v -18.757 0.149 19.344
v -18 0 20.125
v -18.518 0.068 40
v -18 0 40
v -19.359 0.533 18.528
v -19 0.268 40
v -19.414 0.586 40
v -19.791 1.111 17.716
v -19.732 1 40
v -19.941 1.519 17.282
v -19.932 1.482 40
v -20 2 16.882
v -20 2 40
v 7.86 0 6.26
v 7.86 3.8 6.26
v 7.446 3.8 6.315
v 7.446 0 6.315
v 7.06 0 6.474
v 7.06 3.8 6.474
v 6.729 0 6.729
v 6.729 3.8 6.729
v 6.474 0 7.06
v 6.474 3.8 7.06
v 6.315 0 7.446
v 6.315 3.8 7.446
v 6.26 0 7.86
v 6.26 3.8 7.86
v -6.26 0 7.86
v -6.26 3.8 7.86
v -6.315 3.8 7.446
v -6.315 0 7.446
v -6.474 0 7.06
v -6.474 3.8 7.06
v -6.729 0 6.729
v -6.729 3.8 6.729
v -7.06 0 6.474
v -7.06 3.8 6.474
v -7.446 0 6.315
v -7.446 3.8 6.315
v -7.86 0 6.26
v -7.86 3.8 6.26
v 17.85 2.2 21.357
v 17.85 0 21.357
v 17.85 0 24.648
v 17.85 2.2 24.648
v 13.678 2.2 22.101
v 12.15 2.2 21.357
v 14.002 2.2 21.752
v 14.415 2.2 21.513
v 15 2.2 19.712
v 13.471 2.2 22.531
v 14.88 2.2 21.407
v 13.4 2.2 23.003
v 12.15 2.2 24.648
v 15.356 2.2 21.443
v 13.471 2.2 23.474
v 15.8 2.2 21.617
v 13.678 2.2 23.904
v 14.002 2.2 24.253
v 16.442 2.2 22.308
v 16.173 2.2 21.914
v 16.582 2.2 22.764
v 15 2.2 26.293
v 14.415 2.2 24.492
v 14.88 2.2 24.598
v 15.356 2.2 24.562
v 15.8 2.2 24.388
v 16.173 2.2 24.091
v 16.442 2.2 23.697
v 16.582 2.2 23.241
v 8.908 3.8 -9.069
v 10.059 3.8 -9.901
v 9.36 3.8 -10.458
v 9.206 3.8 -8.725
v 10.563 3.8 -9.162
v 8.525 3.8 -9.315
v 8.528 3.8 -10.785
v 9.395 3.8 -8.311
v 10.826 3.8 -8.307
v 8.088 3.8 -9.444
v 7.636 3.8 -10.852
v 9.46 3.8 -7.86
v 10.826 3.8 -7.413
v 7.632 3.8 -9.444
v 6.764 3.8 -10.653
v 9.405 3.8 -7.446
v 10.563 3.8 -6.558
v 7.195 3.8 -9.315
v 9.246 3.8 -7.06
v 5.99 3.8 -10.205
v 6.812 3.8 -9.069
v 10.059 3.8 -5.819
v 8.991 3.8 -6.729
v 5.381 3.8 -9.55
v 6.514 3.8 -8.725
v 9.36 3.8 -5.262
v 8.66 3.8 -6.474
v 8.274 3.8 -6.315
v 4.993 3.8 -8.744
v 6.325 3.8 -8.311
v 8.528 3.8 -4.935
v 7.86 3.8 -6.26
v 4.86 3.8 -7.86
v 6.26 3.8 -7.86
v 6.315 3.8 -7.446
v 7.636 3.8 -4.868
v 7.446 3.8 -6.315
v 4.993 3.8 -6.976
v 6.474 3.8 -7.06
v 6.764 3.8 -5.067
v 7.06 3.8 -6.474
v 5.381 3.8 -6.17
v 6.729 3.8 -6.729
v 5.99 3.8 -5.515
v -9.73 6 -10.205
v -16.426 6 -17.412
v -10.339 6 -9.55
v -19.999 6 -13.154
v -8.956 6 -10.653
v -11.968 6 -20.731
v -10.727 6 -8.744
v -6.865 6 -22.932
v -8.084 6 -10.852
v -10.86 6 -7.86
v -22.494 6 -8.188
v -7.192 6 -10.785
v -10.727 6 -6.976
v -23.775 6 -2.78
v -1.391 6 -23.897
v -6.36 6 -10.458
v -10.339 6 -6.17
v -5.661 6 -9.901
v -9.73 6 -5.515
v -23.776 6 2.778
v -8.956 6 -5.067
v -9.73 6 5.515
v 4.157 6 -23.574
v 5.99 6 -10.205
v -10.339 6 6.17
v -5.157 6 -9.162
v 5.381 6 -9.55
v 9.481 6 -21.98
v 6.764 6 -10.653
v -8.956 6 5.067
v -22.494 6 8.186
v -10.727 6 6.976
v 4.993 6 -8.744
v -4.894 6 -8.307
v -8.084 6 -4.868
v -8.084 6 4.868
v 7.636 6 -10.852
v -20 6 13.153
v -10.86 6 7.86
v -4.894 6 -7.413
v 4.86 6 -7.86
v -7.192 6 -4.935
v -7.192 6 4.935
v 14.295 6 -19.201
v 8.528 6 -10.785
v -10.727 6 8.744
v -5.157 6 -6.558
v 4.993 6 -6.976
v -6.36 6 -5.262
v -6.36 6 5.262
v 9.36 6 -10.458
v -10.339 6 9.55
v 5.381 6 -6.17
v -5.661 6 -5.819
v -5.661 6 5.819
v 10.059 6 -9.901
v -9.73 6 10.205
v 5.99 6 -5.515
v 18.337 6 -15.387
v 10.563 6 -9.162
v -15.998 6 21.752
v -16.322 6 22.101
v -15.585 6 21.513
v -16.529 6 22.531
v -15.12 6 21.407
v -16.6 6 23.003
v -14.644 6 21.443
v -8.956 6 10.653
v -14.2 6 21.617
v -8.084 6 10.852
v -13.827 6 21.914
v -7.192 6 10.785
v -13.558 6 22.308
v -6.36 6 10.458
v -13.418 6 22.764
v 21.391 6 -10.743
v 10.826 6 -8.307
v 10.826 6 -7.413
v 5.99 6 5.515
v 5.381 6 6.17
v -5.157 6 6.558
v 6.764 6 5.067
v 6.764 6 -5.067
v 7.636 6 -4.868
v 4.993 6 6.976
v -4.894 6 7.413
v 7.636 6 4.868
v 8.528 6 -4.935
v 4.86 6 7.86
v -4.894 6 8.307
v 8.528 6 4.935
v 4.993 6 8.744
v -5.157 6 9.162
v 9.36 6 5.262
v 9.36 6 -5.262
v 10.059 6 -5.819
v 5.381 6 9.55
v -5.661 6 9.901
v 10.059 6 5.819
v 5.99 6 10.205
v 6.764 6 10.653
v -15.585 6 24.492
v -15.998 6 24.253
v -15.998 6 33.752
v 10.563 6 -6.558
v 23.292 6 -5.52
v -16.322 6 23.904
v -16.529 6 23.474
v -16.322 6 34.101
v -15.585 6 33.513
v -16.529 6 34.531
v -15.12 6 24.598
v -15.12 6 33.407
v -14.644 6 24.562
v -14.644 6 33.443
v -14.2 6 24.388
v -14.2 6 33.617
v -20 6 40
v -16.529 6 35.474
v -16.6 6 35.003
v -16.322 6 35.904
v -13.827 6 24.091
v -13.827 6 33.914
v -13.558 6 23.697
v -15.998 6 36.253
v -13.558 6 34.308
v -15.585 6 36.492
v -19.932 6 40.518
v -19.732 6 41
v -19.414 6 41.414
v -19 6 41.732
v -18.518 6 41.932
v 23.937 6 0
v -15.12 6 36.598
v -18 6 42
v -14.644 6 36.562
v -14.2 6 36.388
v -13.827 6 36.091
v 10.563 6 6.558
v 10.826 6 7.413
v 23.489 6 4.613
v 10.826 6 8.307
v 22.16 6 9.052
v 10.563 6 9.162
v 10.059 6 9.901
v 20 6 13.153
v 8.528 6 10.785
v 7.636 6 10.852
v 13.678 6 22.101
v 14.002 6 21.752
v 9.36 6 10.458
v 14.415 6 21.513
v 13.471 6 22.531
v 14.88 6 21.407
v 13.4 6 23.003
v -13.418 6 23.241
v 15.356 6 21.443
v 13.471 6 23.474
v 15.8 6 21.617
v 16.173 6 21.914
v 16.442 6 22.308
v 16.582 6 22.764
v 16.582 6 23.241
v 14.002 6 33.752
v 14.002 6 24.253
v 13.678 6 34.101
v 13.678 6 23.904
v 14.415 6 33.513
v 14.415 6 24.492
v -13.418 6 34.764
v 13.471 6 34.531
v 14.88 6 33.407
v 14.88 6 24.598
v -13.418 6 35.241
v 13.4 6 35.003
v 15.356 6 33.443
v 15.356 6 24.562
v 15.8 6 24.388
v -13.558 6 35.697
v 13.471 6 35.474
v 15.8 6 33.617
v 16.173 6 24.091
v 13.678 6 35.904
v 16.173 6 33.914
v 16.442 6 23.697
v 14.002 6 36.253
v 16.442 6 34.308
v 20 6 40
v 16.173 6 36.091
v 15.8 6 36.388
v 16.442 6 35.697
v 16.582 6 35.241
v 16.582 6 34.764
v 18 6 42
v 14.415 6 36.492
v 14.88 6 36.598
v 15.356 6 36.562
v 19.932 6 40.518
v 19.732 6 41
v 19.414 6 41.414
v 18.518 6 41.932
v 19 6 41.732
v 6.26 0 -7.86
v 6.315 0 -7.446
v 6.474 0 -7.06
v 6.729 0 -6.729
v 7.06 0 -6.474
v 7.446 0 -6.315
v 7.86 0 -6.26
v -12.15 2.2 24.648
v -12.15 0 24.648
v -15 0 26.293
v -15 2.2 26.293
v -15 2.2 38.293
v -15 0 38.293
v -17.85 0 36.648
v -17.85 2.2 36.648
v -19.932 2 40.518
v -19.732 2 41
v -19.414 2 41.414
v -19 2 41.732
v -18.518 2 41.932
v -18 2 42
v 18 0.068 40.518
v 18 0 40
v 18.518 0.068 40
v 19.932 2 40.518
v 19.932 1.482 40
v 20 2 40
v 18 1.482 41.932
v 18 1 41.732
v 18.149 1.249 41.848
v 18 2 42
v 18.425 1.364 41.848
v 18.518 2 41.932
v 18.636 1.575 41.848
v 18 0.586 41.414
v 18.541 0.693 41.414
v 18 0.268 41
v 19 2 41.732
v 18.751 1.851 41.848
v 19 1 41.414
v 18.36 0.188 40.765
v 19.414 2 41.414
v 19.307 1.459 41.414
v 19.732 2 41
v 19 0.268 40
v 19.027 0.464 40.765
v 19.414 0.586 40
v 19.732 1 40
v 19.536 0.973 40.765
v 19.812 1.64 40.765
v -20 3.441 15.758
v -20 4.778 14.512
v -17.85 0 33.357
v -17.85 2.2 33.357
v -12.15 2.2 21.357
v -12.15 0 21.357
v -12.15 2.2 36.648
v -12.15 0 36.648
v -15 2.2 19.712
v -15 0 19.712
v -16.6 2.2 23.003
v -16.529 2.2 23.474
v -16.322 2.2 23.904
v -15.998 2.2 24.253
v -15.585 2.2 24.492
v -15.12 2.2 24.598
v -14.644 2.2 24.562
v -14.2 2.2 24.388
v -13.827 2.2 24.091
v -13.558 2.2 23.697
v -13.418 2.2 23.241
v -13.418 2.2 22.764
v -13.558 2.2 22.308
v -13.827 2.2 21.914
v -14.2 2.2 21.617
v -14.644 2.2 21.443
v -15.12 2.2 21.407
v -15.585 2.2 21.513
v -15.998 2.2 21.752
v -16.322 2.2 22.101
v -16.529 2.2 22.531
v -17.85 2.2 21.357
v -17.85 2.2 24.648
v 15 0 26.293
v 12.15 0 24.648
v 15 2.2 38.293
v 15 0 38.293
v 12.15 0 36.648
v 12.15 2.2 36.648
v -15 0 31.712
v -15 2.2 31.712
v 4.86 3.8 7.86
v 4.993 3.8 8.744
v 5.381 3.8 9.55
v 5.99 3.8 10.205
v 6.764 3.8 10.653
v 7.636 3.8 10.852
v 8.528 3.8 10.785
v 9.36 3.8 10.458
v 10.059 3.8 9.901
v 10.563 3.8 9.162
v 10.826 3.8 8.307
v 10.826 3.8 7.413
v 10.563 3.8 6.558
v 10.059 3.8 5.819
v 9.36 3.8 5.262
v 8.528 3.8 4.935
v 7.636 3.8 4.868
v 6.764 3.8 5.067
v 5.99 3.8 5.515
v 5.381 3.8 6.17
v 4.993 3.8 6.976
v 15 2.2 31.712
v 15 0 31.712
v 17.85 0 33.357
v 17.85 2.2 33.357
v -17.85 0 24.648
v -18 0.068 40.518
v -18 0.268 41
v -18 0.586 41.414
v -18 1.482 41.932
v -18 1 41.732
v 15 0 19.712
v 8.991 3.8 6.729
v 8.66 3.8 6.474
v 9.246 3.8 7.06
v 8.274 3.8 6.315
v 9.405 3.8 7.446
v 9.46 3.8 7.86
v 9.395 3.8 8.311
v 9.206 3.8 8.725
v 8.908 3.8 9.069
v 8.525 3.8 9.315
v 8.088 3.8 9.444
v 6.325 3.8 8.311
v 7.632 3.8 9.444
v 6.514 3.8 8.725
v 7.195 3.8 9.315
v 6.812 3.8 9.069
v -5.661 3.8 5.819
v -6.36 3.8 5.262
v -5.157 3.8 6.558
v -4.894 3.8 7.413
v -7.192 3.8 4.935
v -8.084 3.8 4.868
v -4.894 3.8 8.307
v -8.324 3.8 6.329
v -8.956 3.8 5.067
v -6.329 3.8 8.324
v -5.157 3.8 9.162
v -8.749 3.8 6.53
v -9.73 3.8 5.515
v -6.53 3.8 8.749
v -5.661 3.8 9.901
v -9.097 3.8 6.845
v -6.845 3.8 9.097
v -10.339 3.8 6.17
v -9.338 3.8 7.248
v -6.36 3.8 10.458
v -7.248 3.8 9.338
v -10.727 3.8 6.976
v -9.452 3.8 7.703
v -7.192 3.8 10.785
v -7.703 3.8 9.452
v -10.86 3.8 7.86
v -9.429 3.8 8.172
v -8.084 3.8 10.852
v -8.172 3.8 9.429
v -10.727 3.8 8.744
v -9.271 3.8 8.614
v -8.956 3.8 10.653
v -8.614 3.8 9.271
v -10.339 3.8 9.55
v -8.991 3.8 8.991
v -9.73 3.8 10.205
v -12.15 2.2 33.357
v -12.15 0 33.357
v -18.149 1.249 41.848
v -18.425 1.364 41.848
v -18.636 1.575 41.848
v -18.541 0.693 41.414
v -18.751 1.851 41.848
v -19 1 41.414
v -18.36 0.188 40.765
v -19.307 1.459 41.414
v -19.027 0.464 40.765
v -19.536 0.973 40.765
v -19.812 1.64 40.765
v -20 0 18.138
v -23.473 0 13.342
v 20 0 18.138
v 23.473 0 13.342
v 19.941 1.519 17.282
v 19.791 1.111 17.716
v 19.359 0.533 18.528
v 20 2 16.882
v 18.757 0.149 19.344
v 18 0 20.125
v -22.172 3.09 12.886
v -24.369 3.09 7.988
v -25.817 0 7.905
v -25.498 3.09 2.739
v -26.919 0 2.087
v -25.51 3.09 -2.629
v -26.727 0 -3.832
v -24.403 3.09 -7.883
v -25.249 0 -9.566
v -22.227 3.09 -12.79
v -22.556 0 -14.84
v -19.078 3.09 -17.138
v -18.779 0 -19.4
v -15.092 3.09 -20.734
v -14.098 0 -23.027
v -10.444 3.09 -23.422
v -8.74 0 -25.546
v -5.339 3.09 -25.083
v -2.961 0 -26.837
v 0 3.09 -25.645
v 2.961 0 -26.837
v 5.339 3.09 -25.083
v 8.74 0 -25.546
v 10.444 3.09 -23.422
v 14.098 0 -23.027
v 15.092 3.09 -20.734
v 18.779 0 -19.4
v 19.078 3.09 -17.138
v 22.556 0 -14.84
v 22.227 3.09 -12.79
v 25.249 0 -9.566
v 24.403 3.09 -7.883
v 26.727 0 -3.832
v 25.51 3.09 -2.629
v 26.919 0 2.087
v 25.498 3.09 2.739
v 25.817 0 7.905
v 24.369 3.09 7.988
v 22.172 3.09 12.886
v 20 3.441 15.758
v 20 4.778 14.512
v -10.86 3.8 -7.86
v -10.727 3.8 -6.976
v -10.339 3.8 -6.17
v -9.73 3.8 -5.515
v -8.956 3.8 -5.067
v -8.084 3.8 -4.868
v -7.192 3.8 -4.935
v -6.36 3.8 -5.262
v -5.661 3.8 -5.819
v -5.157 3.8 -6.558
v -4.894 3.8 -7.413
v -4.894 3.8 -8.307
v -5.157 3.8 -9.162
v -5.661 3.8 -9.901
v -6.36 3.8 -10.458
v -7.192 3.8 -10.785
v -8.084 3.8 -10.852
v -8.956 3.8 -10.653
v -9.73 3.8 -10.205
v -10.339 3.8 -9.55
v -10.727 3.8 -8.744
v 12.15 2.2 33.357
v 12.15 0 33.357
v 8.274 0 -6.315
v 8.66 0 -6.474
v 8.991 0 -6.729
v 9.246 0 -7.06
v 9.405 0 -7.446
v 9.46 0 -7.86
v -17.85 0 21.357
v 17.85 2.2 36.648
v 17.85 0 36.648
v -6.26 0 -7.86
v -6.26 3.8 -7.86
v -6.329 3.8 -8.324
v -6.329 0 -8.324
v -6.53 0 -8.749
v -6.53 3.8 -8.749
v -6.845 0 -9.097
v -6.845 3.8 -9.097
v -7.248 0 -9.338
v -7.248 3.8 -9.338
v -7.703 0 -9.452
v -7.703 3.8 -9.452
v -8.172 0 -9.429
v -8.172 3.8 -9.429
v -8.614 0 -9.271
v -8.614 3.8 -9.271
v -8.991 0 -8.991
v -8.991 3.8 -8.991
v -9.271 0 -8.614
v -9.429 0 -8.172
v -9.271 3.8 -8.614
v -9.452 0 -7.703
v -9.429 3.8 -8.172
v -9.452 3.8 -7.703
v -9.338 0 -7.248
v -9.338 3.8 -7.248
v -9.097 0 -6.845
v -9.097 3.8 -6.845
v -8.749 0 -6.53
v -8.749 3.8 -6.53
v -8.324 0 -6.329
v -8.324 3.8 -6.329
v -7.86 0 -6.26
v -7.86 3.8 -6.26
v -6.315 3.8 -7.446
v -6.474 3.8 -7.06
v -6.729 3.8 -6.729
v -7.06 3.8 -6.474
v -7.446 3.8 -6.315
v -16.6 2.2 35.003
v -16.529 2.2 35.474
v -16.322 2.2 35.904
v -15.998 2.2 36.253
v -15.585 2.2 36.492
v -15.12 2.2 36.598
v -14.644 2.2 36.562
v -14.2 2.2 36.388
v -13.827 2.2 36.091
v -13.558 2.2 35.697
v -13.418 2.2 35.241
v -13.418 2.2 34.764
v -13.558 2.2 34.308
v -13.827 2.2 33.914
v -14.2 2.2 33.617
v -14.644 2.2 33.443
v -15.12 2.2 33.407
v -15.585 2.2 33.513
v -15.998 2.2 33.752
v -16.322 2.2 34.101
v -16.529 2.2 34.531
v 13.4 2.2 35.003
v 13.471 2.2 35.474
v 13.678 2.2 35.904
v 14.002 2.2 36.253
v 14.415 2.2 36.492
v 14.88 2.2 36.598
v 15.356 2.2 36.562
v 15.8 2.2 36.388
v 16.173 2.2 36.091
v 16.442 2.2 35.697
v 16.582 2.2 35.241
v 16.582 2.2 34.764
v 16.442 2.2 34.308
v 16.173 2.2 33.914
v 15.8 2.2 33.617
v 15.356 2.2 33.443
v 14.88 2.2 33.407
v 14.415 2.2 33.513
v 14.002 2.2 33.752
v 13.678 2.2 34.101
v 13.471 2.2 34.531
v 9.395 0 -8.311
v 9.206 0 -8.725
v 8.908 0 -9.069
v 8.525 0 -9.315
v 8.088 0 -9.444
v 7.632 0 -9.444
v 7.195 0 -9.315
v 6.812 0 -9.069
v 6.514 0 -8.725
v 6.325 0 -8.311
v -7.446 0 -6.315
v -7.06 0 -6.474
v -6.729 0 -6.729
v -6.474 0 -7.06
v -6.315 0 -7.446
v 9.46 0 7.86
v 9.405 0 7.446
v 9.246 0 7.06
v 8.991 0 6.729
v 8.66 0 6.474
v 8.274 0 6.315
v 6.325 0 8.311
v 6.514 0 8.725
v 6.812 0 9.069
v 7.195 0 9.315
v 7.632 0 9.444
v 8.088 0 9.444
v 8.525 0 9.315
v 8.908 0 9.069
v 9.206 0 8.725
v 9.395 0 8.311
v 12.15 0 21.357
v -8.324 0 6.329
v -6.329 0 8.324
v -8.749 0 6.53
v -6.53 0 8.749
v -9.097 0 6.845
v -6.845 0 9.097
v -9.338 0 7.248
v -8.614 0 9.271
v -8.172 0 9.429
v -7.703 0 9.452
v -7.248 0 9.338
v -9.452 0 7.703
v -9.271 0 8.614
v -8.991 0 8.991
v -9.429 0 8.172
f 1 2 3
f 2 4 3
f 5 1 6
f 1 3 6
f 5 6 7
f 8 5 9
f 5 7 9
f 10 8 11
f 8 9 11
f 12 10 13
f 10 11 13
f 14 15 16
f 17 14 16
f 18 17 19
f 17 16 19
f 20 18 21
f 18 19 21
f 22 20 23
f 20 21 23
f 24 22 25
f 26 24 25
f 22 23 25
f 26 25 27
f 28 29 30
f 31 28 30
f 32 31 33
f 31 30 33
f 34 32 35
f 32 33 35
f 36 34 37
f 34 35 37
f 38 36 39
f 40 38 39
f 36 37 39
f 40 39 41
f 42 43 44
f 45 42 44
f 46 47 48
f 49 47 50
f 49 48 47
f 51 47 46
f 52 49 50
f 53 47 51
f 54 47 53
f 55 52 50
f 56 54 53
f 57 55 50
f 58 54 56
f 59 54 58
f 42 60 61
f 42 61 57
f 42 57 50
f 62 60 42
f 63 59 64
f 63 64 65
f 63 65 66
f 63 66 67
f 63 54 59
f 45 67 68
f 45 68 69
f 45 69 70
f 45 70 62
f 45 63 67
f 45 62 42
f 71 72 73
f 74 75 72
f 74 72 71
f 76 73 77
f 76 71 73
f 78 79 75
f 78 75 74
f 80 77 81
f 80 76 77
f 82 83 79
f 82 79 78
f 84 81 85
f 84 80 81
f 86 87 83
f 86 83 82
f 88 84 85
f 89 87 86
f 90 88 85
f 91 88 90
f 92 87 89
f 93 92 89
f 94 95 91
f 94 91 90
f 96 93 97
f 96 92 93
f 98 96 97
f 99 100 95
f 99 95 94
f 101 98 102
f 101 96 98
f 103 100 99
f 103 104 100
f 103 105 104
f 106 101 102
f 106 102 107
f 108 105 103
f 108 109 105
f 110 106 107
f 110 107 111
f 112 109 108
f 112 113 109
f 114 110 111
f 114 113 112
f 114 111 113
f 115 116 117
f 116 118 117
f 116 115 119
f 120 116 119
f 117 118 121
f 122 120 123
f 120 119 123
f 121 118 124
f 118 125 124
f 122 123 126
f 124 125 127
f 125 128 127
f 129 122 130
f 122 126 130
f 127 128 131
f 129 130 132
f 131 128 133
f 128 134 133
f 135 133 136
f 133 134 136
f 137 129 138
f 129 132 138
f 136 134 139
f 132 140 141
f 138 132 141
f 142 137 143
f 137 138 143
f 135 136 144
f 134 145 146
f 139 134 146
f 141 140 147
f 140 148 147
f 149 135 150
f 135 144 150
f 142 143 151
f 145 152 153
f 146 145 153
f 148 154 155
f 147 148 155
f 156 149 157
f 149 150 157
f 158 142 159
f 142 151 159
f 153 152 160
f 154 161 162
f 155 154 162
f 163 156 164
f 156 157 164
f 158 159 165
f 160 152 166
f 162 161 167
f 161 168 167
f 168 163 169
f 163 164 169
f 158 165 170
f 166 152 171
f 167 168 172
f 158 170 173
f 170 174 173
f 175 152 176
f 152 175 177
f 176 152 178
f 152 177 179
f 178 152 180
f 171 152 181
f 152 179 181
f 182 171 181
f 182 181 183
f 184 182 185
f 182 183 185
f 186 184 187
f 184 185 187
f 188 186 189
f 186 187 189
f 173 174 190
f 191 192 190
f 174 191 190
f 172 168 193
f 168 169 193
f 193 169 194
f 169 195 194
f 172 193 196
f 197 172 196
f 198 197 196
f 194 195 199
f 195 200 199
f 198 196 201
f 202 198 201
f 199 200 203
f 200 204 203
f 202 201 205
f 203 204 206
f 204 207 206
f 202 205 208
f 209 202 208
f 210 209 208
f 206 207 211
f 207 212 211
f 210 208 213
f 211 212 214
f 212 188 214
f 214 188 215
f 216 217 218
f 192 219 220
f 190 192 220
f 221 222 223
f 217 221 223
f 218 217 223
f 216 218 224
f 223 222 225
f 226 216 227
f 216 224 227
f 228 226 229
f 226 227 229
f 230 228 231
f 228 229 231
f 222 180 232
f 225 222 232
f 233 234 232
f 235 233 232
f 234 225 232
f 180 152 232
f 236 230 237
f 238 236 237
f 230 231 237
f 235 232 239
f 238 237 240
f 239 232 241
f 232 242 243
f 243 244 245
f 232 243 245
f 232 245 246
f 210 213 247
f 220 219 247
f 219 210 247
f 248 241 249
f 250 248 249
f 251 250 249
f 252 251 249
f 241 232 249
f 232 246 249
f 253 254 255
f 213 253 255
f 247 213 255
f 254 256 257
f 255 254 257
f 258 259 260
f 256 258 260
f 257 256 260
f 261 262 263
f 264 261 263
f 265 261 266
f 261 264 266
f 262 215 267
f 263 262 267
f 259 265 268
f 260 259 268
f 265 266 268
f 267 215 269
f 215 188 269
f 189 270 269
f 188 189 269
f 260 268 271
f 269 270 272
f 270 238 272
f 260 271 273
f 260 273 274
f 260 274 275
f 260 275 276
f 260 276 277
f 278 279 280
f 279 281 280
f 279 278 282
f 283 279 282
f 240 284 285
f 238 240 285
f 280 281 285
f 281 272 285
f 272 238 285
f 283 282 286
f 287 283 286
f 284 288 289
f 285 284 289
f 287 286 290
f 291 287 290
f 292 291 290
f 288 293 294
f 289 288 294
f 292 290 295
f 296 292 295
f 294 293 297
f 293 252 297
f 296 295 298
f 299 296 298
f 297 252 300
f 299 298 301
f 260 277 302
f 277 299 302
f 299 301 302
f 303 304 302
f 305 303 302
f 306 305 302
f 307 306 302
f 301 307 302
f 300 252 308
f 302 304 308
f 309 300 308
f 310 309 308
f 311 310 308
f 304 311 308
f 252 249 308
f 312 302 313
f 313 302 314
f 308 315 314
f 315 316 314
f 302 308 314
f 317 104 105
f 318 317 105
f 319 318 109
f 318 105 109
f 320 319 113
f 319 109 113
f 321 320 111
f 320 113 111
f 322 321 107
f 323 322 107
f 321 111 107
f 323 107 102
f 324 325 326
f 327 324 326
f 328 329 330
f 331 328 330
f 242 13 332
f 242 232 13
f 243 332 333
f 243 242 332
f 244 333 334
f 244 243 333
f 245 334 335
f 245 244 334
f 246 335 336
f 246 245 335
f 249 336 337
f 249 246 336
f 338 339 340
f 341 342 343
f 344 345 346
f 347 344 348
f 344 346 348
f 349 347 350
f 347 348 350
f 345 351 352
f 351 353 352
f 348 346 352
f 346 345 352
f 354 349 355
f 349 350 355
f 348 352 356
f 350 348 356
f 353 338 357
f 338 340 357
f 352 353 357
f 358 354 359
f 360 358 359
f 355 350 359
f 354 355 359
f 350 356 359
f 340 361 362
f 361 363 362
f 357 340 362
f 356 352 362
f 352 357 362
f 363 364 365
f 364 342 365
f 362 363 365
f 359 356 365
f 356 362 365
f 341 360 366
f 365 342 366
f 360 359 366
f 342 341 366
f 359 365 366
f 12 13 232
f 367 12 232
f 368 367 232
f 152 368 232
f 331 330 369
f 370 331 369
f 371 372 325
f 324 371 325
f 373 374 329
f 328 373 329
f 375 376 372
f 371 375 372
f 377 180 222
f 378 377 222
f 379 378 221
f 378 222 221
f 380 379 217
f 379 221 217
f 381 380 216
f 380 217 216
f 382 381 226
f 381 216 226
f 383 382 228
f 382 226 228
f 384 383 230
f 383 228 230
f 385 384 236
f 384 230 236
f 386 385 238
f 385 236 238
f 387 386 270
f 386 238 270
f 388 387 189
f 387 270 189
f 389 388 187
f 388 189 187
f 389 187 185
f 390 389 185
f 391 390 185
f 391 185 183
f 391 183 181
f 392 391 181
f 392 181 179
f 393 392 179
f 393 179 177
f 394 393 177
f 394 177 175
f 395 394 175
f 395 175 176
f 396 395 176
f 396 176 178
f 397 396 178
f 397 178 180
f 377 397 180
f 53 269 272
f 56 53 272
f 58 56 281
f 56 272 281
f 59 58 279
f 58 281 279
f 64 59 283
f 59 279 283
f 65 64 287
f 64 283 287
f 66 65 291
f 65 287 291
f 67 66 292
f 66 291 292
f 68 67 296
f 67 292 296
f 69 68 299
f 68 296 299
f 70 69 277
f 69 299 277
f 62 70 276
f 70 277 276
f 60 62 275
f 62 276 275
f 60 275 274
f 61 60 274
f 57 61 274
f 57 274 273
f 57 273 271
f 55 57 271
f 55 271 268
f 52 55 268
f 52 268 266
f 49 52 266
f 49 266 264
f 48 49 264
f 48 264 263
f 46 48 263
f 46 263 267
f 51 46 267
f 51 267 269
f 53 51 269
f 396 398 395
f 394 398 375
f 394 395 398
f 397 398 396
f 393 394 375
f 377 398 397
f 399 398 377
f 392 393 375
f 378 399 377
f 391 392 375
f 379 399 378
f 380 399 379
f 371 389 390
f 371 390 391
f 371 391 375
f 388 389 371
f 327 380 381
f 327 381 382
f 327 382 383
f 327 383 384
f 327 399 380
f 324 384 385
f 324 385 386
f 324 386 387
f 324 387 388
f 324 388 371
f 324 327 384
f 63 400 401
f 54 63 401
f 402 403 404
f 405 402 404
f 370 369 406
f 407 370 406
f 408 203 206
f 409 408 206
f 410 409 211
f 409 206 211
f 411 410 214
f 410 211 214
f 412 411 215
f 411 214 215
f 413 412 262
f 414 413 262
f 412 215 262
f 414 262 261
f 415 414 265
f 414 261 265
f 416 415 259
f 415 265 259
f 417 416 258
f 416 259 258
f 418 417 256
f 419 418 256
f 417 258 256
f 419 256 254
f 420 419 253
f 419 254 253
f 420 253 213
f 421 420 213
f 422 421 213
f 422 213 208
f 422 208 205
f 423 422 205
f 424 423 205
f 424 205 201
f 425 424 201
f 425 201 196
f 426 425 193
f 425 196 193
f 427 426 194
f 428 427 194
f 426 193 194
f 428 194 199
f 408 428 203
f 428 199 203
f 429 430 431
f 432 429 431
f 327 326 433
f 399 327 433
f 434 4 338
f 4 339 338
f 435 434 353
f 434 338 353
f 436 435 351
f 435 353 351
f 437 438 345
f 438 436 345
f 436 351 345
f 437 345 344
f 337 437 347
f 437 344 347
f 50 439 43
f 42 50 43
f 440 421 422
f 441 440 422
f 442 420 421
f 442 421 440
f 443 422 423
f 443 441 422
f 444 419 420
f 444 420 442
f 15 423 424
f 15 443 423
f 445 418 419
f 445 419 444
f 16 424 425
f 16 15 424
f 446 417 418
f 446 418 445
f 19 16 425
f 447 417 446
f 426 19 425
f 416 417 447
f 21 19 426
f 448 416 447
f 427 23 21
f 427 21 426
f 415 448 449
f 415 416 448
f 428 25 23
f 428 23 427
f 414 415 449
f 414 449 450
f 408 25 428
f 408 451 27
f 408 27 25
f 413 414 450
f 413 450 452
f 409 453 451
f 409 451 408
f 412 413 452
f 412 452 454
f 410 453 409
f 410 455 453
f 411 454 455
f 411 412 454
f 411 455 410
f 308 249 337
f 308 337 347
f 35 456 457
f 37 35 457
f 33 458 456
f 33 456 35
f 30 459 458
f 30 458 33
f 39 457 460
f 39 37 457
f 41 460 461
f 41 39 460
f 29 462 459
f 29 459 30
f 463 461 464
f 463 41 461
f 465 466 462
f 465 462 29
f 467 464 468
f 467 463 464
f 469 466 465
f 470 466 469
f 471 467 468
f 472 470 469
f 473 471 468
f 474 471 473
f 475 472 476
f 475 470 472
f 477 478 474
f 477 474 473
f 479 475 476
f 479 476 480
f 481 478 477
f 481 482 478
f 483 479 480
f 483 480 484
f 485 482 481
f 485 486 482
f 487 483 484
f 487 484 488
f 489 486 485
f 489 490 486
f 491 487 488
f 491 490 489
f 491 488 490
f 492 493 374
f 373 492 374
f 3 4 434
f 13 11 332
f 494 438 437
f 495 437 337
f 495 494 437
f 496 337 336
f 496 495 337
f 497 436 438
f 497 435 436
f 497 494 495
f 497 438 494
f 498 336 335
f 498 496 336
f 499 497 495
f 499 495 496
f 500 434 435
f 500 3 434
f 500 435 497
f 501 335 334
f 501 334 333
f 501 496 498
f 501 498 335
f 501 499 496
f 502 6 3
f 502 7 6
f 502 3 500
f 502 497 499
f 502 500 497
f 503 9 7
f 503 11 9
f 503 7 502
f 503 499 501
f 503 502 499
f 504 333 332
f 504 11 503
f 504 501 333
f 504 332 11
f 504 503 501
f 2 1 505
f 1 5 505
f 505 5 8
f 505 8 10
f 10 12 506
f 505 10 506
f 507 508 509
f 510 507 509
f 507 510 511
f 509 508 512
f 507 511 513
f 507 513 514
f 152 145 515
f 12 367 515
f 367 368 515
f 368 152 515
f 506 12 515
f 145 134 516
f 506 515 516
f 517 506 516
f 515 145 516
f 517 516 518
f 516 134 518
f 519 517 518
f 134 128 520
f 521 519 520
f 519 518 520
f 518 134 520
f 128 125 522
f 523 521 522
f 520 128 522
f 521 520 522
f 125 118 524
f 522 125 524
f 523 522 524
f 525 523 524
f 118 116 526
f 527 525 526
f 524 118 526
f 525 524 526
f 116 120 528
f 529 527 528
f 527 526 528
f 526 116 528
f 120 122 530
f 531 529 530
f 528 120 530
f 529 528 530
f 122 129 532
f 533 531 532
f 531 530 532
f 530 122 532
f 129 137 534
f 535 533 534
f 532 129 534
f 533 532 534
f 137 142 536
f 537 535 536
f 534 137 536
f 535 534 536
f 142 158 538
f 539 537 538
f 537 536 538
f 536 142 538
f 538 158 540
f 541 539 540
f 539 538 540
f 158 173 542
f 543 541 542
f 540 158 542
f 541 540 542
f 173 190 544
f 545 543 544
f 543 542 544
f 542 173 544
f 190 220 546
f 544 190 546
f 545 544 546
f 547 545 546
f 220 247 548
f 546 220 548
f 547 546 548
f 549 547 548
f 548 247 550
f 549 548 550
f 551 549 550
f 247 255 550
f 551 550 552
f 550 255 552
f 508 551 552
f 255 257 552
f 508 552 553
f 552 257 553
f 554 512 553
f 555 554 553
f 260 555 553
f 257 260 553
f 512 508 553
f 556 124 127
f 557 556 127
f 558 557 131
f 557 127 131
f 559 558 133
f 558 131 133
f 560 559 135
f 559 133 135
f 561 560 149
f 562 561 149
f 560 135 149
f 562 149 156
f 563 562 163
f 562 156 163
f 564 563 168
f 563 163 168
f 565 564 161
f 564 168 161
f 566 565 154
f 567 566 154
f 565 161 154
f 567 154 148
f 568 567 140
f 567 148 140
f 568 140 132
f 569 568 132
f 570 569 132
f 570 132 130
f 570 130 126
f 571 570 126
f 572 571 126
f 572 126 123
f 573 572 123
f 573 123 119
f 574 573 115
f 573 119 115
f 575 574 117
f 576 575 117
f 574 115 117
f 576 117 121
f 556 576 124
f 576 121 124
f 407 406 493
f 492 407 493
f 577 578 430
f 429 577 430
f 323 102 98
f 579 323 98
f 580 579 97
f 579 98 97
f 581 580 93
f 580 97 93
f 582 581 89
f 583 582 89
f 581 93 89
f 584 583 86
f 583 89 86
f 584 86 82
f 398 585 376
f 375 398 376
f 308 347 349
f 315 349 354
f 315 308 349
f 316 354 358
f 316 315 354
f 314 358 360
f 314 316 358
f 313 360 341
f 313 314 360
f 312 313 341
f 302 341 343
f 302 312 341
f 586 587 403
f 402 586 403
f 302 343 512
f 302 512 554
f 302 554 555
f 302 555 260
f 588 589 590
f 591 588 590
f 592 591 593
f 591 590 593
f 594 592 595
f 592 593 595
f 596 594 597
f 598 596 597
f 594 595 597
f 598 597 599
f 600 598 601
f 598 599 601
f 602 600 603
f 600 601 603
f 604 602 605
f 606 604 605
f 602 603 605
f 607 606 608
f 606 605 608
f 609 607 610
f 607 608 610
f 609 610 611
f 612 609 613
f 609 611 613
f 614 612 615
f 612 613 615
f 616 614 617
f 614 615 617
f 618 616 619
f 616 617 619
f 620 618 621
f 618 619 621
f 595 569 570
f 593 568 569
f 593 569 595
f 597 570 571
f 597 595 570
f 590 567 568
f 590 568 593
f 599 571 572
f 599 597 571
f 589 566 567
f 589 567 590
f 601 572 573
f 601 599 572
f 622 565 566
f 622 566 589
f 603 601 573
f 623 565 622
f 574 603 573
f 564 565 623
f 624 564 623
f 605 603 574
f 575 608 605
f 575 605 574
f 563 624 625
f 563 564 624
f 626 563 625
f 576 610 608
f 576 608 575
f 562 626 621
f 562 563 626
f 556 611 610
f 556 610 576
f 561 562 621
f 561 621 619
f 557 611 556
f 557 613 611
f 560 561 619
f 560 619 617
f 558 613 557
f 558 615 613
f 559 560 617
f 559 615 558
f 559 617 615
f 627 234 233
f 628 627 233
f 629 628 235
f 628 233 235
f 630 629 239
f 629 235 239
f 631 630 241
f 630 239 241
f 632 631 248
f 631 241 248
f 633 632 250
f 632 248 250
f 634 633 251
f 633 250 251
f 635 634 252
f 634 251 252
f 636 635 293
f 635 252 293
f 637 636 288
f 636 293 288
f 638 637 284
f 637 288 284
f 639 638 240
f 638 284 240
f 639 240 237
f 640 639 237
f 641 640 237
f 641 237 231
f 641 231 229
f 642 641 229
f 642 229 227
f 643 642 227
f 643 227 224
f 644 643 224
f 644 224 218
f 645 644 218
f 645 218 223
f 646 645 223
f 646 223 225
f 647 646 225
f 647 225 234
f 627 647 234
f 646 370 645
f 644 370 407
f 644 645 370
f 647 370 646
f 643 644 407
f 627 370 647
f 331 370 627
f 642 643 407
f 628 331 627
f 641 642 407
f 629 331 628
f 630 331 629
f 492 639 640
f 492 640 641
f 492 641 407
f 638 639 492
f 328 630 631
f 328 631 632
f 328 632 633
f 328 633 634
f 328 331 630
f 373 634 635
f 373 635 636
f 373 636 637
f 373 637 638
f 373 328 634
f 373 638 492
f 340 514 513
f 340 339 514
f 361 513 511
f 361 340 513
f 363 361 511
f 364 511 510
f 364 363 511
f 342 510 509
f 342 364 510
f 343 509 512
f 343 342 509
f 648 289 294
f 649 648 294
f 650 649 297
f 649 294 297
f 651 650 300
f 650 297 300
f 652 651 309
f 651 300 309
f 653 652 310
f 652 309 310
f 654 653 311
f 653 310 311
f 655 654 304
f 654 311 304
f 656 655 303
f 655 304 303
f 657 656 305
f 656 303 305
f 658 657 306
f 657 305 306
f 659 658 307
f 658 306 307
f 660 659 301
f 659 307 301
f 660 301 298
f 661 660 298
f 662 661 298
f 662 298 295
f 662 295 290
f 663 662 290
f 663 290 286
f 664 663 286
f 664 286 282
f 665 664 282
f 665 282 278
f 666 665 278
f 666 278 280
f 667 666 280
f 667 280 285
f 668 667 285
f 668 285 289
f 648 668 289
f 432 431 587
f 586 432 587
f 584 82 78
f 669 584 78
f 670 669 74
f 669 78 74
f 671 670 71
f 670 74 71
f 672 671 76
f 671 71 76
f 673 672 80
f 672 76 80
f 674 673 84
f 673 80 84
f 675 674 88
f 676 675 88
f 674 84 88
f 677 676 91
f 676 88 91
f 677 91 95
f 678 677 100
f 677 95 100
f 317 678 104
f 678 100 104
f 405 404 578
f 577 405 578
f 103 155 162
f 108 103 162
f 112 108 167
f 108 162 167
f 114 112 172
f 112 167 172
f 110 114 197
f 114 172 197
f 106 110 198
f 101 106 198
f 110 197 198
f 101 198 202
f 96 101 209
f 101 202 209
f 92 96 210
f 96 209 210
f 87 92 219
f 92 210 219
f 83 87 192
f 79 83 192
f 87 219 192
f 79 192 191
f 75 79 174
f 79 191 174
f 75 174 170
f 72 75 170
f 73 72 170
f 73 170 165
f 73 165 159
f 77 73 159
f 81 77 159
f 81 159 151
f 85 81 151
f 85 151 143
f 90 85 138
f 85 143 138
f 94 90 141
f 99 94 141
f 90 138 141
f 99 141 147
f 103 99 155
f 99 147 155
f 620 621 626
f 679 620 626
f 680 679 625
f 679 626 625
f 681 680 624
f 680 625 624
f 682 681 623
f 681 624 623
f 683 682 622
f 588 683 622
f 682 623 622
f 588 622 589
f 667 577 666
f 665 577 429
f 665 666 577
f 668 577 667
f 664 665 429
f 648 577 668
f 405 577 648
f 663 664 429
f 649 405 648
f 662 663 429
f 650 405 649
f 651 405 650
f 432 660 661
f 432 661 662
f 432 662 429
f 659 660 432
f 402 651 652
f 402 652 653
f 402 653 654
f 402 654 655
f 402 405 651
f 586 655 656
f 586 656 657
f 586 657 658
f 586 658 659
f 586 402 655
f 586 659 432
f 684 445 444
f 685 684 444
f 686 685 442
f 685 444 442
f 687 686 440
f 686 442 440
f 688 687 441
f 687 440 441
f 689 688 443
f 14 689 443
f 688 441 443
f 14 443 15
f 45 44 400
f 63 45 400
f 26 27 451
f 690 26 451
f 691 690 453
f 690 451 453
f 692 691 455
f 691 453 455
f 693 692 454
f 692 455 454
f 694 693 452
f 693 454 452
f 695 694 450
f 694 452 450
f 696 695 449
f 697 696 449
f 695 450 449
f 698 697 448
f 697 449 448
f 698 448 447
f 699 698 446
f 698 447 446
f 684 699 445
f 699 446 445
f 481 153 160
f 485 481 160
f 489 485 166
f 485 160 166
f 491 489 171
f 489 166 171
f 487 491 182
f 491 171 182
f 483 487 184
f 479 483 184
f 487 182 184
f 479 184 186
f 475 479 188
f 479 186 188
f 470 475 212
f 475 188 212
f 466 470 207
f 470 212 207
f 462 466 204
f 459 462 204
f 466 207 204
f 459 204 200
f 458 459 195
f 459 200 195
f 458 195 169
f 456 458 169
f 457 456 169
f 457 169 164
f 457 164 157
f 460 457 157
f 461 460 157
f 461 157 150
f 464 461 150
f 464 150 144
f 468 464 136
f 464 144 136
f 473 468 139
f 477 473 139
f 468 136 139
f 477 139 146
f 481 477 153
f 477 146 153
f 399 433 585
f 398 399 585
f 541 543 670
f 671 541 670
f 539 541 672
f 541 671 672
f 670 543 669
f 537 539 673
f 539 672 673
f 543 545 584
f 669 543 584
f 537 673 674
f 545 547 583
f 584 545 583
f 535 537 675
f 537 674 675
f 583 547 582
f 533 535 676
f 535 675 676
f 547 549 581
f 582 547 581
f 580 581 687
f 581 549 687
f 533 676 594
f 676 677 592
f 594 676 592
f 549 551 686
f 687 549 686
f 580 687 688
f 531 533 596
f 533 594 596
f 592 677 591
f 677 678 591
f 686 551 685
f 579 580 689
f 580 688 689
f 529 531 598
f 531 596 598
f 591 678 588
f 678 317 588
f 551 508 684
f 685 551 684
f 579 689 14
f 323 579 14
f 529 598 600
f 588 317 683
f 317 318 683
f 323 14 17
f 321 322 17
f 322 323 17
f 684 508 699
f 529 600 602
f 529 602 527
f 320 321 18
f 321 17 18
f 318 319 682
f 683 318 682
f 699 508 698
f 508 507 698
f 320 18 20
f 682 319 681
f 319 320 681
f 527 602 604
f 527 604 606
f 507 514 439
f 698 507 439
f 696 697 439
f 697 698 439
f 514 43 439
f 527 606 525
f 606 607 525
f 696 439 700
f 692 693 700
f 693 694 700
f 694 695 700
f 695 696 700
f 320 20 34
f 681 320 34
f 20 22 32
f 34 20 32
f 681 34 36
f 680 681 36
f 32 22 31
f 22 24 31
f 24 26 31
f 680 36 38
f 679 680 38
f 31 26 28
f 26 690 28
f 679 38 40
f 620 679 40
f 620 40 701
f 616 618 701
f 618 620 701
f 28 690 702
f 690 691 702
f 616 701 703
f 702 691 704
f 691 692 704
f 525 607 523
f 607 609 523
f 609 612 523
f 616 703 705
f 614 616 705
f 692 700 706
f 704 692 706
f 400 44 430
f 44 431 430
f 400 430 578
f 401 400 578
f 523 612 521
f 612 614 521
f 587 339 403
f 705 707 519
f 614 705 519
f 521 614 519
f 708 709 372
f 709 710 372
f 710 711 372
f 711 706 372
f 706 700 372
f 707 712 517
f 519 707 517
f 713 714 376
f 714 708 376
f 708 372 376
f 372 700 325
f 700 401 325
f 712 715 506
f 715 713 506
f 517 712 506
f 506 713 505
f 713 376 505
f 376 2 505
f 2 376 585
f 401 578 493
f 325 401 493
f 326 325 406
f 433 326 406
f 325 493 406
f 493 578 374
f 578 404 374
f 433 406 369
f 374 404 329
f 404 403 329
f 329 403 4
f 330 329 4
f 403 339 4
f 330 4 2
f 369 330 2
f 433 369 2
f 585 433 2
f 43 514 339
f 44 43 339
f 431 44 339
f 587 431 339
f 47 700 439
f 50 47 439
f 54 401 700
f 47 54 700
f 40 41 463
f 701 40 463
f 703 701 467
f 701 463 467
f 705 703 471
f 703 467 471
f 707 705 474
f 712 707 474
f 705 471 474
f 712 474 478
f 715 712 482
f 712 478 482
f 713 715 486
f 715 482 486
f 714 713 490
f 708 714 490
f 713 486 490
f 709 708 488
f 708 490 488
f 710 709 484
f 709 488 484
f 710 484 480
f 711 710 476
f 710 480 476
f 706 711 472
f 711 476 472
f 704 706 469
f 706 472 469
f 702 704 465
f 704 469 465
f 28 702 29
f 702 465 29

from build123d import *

# Parameters (mm, degrees)
SKETCH_15_W          = 40
SKETCH_15_H          = 18.792360098
EXTRUDE_5_DEPTH      = 42
CUT_EXTRUDE_9_DEPTH  = 77.440518039
CUT_EXTRUDE_10_DEPTH = 51.289163843
SKETCH_18_R          = 3
CUT_EXTRUDE_11_DEPTH = 2.2
SKETCH_19_R          = 1.6
CUT_EXTRUDE_12_DEPTH = 51.289163843
CUT_EXTRUDE_13_DEPTH = 2.2
FILLET_2_R           = 2


with BuildPart() as part:
    # 草图14 → 旋转4 (revolve)
    with BuildSketch(Plane.XY):
        with BuildLine():
            Line((0, 18.792360098), (0, 0))
            Line((0, 0), (27, 0))
            ThreePointArc((27, 0), (16.448045462, 13.631796387), (0, 18.792360098))
        make_face()
    revolve(axis=Axis((0, 18.792360098, 0), (0, -1, 0)))

    # 草图15 → 凸台-拉伸5 (add)
    with BuildSketch(Plane.XY):
        with Locations((0, 9.396180049)):
            Rectangle(SKETCH_15_W, SKETCH_15_H)
    extrude(amount=EXTRUDE_5_DEPTH)

    # 草图16 → 切除-拉伸9 (cut, through all)
    with BuildSketch(Plane.XY.offset(42)):
        Polygon((-20, 6), (0, 6), (20, 6), (20, 18.792360098), (-20, 18.792360098), align=None)
        Polygon((20, 18.792360098), (20, 6), (23.937418407, 6), (23.937418407, 21.459034266), (-28.897937851, 21.459034266), (-28.897937851, 6), (-20, 6), (-20, 18.792360098), align=None)
    extrude(amount=-CUT_EXTRUDE_9_DEPTH, mode=Mode.SUBTRACT)

    # 草图17 → 切除-拉伸10 (cut, through all)
    with BuildSketch(Plane(origin=(0, 6, 0), x_dir=(1, 0, 0), z_dir=(0, 1, 0))):
        with BuildLine():
            Line((-7.86, 6.26), (-7.86, 7.86))
            Line((-7.86, 7.86), (-6.26, 7.86))
            ThreePointArc((-6.26, 7.86), (-8.99137085, 8.99137085), (-7.86, 6.26))
        make_face()
        with BuildLine():
            Line((-6.26, 7.86), (-7.86, 7.86))
            Line((-7.86, 7.86), (-7.86, 6.26))
            ThreePointArc((-7.86, 6.26), (-6.72862915, 6.72862915), (-6.26, 7.86))
        make_face()
        with BuildLine():
            ThreePointArc((9.46, 7.86), (7.86, 9.46), (6.26, 7.86))
            Line((6.26, 7.86), (7.86, 7.86))
            Line((7.86, 7.86), (7.86, 6.26))
            ThreePointArc((7.86, 6.26), (8.99137085, 6.72862915), (9.46, 7.86))
        make_face()
        with BuildLine():
            Line((7.86, 7.86), (6.26, 7.86))
            ThreePointArc((6.26, 7.86), (6.72862915, 6.72862915), (7.86, 6.26))
            Line((7.86, 6.26), (7.86, 7.86))
        make_face()
        with BuildLine():
            ThreePointArc((9.46, -7.86), (8.99137085, -6.72862915), (7.86, -6.26))
            Line((7.86, -6.26), (7.86, -7.86))
            Line((7.86, -7.86), (6.26, -7.86))
            ThreePointArc((6.26, -7.86), (7.86, -9.46), (9.46, -7.86))
        make_face()
        with BuildLine():
            Line((7.86, -7.86), (7.86, -6.26))
            ThreePointArc((7.86, -6.26), (6.72862915, -6.72862915), (6.26, -7.86))
            Line((6.26, -7.86), (7.86, -7.86))
        make_face()
        with BuildLine():
            ThreePointArc((-6.26, -7.86), (-6.72862915, -6.72862915), (-7.86, -6.26))
            Line((-7.86, -6.26), (-7.86, -7.86))
            Line((-7.86, -7.86), (-6.26, -7.86))
        make_face()
        with BuildLine():
            Line((-7.86, -7.86), (-7.86, -6.26))
            ThreePointArc((-7.86, -6.26), (-8.99137085, -8.99137085), (-6.26, -7.86))
            Line((-6.26, -7.86), (-7.86, -7.86))
        make_face()
    extrude(amount=-CUT_EXTRUDE_10_DEPTH, mode=Mode.SUBTRACT)

    # 草图18 → 切除-拉伸11 (cut)
    with BuildSketch(Plane(origin=(0, 6, 0), x_dir=(1, 0, 0), z_dir=(0, 1, 0))):
        with Locations(Location((7.86, 7.86, 0), (0, 0, 180))):
            Circle(SKETCH_18_R)
        with Locations(Location((7.86, -7.86, 0), (0, 0, 180))):
            Circle(SKETCH_18_R)
        with Locations(Location((-7.86, -7.86, 0), (0, 0, 180))):
            Circle(SKETCH_18_R)
        with Locations(Location((-7.86, 7.86, 0), (0, 0, 180))):
            Circle(SKETCH_18_R)
    extrude(amount=-CUT_EXTRUDE_11_DEPTH, mode=Mode.SUBTRACT)

    # 草图19 → 切除-拉伸12 (cut, through all)
    with BuildSketch(Plane(origin=(0, 6, 0), x_dir=(1, 0, 0), z_dir=(0, 1, 0))):
        with Locations(Location((15, -23.002515628, 0), (0, 0, 180))):
            Circle(SKETCH_19_R)
        with Locations(Location((-15, -23.002515628, 0), (0, 0, 180))):
            Circle(SKETCH_19_R)
        with Locations(Location((-15, -35.002515628, 0), (0, 0, 180))):
            Circle(SKETCH_19_R)
        with Locations(Location((15, -35.002515628, 0), (0, 0, 180))):
            Circle(SKETCH_19_R)
    extrude(amount=-CUT_EXTRUDE_12_DEPTH, mode=Mode.SUBTRACT)

    # 草图20 → 切除-拉伸13 (cut)
    with BuildSketch(Plane.XZ):
        Polygon((-15, 31.711619093), (-12.15, 33.35706736), (-12.15, 36.647963895), (-15, 38.293412162), (-17.85, 36.647963895), (-17.85, 33.35706736), align=None)
        Polygon((15, 31.711619093), (17.85, 33.35706736), (17.85, 36.647963895), (15, 38.293412162), (12.15, 36.647963895), (12.15, 33.35706736), align=None)
        Polygon((-15, 19.711619093), (-12.15, 21.35706736), (-12.15, 24.647963895), (-15, 26.293412162), (-17.85, 24.647963895), (-17.85, 21.35706736), align=None)
        Polygon((15, 19.711619093), (17.85, 21.35706736), (17.85, 24.647963895), (15, 26.293412162), (12.15, 24.647963895), (12.15, 21.35706736), align=None)
    extrude(amount=-CUT_EXTRUDE_13_DEPTH, mode=Mode.SUBTRACT)

    # 圆角2
    fillet_2_edges = [part.edges().sort_by_distance(p)[0] for p in [
        (20, 0, 30.069178574),
        (-20, 0, 30.069178574),
        (0, 0, 42),
        (-20, 3, 42),
        (20, 3, 42),
    ]]
    fillet(fillet_2_edges, radius=FILLET_2_R)


solid = part.part
